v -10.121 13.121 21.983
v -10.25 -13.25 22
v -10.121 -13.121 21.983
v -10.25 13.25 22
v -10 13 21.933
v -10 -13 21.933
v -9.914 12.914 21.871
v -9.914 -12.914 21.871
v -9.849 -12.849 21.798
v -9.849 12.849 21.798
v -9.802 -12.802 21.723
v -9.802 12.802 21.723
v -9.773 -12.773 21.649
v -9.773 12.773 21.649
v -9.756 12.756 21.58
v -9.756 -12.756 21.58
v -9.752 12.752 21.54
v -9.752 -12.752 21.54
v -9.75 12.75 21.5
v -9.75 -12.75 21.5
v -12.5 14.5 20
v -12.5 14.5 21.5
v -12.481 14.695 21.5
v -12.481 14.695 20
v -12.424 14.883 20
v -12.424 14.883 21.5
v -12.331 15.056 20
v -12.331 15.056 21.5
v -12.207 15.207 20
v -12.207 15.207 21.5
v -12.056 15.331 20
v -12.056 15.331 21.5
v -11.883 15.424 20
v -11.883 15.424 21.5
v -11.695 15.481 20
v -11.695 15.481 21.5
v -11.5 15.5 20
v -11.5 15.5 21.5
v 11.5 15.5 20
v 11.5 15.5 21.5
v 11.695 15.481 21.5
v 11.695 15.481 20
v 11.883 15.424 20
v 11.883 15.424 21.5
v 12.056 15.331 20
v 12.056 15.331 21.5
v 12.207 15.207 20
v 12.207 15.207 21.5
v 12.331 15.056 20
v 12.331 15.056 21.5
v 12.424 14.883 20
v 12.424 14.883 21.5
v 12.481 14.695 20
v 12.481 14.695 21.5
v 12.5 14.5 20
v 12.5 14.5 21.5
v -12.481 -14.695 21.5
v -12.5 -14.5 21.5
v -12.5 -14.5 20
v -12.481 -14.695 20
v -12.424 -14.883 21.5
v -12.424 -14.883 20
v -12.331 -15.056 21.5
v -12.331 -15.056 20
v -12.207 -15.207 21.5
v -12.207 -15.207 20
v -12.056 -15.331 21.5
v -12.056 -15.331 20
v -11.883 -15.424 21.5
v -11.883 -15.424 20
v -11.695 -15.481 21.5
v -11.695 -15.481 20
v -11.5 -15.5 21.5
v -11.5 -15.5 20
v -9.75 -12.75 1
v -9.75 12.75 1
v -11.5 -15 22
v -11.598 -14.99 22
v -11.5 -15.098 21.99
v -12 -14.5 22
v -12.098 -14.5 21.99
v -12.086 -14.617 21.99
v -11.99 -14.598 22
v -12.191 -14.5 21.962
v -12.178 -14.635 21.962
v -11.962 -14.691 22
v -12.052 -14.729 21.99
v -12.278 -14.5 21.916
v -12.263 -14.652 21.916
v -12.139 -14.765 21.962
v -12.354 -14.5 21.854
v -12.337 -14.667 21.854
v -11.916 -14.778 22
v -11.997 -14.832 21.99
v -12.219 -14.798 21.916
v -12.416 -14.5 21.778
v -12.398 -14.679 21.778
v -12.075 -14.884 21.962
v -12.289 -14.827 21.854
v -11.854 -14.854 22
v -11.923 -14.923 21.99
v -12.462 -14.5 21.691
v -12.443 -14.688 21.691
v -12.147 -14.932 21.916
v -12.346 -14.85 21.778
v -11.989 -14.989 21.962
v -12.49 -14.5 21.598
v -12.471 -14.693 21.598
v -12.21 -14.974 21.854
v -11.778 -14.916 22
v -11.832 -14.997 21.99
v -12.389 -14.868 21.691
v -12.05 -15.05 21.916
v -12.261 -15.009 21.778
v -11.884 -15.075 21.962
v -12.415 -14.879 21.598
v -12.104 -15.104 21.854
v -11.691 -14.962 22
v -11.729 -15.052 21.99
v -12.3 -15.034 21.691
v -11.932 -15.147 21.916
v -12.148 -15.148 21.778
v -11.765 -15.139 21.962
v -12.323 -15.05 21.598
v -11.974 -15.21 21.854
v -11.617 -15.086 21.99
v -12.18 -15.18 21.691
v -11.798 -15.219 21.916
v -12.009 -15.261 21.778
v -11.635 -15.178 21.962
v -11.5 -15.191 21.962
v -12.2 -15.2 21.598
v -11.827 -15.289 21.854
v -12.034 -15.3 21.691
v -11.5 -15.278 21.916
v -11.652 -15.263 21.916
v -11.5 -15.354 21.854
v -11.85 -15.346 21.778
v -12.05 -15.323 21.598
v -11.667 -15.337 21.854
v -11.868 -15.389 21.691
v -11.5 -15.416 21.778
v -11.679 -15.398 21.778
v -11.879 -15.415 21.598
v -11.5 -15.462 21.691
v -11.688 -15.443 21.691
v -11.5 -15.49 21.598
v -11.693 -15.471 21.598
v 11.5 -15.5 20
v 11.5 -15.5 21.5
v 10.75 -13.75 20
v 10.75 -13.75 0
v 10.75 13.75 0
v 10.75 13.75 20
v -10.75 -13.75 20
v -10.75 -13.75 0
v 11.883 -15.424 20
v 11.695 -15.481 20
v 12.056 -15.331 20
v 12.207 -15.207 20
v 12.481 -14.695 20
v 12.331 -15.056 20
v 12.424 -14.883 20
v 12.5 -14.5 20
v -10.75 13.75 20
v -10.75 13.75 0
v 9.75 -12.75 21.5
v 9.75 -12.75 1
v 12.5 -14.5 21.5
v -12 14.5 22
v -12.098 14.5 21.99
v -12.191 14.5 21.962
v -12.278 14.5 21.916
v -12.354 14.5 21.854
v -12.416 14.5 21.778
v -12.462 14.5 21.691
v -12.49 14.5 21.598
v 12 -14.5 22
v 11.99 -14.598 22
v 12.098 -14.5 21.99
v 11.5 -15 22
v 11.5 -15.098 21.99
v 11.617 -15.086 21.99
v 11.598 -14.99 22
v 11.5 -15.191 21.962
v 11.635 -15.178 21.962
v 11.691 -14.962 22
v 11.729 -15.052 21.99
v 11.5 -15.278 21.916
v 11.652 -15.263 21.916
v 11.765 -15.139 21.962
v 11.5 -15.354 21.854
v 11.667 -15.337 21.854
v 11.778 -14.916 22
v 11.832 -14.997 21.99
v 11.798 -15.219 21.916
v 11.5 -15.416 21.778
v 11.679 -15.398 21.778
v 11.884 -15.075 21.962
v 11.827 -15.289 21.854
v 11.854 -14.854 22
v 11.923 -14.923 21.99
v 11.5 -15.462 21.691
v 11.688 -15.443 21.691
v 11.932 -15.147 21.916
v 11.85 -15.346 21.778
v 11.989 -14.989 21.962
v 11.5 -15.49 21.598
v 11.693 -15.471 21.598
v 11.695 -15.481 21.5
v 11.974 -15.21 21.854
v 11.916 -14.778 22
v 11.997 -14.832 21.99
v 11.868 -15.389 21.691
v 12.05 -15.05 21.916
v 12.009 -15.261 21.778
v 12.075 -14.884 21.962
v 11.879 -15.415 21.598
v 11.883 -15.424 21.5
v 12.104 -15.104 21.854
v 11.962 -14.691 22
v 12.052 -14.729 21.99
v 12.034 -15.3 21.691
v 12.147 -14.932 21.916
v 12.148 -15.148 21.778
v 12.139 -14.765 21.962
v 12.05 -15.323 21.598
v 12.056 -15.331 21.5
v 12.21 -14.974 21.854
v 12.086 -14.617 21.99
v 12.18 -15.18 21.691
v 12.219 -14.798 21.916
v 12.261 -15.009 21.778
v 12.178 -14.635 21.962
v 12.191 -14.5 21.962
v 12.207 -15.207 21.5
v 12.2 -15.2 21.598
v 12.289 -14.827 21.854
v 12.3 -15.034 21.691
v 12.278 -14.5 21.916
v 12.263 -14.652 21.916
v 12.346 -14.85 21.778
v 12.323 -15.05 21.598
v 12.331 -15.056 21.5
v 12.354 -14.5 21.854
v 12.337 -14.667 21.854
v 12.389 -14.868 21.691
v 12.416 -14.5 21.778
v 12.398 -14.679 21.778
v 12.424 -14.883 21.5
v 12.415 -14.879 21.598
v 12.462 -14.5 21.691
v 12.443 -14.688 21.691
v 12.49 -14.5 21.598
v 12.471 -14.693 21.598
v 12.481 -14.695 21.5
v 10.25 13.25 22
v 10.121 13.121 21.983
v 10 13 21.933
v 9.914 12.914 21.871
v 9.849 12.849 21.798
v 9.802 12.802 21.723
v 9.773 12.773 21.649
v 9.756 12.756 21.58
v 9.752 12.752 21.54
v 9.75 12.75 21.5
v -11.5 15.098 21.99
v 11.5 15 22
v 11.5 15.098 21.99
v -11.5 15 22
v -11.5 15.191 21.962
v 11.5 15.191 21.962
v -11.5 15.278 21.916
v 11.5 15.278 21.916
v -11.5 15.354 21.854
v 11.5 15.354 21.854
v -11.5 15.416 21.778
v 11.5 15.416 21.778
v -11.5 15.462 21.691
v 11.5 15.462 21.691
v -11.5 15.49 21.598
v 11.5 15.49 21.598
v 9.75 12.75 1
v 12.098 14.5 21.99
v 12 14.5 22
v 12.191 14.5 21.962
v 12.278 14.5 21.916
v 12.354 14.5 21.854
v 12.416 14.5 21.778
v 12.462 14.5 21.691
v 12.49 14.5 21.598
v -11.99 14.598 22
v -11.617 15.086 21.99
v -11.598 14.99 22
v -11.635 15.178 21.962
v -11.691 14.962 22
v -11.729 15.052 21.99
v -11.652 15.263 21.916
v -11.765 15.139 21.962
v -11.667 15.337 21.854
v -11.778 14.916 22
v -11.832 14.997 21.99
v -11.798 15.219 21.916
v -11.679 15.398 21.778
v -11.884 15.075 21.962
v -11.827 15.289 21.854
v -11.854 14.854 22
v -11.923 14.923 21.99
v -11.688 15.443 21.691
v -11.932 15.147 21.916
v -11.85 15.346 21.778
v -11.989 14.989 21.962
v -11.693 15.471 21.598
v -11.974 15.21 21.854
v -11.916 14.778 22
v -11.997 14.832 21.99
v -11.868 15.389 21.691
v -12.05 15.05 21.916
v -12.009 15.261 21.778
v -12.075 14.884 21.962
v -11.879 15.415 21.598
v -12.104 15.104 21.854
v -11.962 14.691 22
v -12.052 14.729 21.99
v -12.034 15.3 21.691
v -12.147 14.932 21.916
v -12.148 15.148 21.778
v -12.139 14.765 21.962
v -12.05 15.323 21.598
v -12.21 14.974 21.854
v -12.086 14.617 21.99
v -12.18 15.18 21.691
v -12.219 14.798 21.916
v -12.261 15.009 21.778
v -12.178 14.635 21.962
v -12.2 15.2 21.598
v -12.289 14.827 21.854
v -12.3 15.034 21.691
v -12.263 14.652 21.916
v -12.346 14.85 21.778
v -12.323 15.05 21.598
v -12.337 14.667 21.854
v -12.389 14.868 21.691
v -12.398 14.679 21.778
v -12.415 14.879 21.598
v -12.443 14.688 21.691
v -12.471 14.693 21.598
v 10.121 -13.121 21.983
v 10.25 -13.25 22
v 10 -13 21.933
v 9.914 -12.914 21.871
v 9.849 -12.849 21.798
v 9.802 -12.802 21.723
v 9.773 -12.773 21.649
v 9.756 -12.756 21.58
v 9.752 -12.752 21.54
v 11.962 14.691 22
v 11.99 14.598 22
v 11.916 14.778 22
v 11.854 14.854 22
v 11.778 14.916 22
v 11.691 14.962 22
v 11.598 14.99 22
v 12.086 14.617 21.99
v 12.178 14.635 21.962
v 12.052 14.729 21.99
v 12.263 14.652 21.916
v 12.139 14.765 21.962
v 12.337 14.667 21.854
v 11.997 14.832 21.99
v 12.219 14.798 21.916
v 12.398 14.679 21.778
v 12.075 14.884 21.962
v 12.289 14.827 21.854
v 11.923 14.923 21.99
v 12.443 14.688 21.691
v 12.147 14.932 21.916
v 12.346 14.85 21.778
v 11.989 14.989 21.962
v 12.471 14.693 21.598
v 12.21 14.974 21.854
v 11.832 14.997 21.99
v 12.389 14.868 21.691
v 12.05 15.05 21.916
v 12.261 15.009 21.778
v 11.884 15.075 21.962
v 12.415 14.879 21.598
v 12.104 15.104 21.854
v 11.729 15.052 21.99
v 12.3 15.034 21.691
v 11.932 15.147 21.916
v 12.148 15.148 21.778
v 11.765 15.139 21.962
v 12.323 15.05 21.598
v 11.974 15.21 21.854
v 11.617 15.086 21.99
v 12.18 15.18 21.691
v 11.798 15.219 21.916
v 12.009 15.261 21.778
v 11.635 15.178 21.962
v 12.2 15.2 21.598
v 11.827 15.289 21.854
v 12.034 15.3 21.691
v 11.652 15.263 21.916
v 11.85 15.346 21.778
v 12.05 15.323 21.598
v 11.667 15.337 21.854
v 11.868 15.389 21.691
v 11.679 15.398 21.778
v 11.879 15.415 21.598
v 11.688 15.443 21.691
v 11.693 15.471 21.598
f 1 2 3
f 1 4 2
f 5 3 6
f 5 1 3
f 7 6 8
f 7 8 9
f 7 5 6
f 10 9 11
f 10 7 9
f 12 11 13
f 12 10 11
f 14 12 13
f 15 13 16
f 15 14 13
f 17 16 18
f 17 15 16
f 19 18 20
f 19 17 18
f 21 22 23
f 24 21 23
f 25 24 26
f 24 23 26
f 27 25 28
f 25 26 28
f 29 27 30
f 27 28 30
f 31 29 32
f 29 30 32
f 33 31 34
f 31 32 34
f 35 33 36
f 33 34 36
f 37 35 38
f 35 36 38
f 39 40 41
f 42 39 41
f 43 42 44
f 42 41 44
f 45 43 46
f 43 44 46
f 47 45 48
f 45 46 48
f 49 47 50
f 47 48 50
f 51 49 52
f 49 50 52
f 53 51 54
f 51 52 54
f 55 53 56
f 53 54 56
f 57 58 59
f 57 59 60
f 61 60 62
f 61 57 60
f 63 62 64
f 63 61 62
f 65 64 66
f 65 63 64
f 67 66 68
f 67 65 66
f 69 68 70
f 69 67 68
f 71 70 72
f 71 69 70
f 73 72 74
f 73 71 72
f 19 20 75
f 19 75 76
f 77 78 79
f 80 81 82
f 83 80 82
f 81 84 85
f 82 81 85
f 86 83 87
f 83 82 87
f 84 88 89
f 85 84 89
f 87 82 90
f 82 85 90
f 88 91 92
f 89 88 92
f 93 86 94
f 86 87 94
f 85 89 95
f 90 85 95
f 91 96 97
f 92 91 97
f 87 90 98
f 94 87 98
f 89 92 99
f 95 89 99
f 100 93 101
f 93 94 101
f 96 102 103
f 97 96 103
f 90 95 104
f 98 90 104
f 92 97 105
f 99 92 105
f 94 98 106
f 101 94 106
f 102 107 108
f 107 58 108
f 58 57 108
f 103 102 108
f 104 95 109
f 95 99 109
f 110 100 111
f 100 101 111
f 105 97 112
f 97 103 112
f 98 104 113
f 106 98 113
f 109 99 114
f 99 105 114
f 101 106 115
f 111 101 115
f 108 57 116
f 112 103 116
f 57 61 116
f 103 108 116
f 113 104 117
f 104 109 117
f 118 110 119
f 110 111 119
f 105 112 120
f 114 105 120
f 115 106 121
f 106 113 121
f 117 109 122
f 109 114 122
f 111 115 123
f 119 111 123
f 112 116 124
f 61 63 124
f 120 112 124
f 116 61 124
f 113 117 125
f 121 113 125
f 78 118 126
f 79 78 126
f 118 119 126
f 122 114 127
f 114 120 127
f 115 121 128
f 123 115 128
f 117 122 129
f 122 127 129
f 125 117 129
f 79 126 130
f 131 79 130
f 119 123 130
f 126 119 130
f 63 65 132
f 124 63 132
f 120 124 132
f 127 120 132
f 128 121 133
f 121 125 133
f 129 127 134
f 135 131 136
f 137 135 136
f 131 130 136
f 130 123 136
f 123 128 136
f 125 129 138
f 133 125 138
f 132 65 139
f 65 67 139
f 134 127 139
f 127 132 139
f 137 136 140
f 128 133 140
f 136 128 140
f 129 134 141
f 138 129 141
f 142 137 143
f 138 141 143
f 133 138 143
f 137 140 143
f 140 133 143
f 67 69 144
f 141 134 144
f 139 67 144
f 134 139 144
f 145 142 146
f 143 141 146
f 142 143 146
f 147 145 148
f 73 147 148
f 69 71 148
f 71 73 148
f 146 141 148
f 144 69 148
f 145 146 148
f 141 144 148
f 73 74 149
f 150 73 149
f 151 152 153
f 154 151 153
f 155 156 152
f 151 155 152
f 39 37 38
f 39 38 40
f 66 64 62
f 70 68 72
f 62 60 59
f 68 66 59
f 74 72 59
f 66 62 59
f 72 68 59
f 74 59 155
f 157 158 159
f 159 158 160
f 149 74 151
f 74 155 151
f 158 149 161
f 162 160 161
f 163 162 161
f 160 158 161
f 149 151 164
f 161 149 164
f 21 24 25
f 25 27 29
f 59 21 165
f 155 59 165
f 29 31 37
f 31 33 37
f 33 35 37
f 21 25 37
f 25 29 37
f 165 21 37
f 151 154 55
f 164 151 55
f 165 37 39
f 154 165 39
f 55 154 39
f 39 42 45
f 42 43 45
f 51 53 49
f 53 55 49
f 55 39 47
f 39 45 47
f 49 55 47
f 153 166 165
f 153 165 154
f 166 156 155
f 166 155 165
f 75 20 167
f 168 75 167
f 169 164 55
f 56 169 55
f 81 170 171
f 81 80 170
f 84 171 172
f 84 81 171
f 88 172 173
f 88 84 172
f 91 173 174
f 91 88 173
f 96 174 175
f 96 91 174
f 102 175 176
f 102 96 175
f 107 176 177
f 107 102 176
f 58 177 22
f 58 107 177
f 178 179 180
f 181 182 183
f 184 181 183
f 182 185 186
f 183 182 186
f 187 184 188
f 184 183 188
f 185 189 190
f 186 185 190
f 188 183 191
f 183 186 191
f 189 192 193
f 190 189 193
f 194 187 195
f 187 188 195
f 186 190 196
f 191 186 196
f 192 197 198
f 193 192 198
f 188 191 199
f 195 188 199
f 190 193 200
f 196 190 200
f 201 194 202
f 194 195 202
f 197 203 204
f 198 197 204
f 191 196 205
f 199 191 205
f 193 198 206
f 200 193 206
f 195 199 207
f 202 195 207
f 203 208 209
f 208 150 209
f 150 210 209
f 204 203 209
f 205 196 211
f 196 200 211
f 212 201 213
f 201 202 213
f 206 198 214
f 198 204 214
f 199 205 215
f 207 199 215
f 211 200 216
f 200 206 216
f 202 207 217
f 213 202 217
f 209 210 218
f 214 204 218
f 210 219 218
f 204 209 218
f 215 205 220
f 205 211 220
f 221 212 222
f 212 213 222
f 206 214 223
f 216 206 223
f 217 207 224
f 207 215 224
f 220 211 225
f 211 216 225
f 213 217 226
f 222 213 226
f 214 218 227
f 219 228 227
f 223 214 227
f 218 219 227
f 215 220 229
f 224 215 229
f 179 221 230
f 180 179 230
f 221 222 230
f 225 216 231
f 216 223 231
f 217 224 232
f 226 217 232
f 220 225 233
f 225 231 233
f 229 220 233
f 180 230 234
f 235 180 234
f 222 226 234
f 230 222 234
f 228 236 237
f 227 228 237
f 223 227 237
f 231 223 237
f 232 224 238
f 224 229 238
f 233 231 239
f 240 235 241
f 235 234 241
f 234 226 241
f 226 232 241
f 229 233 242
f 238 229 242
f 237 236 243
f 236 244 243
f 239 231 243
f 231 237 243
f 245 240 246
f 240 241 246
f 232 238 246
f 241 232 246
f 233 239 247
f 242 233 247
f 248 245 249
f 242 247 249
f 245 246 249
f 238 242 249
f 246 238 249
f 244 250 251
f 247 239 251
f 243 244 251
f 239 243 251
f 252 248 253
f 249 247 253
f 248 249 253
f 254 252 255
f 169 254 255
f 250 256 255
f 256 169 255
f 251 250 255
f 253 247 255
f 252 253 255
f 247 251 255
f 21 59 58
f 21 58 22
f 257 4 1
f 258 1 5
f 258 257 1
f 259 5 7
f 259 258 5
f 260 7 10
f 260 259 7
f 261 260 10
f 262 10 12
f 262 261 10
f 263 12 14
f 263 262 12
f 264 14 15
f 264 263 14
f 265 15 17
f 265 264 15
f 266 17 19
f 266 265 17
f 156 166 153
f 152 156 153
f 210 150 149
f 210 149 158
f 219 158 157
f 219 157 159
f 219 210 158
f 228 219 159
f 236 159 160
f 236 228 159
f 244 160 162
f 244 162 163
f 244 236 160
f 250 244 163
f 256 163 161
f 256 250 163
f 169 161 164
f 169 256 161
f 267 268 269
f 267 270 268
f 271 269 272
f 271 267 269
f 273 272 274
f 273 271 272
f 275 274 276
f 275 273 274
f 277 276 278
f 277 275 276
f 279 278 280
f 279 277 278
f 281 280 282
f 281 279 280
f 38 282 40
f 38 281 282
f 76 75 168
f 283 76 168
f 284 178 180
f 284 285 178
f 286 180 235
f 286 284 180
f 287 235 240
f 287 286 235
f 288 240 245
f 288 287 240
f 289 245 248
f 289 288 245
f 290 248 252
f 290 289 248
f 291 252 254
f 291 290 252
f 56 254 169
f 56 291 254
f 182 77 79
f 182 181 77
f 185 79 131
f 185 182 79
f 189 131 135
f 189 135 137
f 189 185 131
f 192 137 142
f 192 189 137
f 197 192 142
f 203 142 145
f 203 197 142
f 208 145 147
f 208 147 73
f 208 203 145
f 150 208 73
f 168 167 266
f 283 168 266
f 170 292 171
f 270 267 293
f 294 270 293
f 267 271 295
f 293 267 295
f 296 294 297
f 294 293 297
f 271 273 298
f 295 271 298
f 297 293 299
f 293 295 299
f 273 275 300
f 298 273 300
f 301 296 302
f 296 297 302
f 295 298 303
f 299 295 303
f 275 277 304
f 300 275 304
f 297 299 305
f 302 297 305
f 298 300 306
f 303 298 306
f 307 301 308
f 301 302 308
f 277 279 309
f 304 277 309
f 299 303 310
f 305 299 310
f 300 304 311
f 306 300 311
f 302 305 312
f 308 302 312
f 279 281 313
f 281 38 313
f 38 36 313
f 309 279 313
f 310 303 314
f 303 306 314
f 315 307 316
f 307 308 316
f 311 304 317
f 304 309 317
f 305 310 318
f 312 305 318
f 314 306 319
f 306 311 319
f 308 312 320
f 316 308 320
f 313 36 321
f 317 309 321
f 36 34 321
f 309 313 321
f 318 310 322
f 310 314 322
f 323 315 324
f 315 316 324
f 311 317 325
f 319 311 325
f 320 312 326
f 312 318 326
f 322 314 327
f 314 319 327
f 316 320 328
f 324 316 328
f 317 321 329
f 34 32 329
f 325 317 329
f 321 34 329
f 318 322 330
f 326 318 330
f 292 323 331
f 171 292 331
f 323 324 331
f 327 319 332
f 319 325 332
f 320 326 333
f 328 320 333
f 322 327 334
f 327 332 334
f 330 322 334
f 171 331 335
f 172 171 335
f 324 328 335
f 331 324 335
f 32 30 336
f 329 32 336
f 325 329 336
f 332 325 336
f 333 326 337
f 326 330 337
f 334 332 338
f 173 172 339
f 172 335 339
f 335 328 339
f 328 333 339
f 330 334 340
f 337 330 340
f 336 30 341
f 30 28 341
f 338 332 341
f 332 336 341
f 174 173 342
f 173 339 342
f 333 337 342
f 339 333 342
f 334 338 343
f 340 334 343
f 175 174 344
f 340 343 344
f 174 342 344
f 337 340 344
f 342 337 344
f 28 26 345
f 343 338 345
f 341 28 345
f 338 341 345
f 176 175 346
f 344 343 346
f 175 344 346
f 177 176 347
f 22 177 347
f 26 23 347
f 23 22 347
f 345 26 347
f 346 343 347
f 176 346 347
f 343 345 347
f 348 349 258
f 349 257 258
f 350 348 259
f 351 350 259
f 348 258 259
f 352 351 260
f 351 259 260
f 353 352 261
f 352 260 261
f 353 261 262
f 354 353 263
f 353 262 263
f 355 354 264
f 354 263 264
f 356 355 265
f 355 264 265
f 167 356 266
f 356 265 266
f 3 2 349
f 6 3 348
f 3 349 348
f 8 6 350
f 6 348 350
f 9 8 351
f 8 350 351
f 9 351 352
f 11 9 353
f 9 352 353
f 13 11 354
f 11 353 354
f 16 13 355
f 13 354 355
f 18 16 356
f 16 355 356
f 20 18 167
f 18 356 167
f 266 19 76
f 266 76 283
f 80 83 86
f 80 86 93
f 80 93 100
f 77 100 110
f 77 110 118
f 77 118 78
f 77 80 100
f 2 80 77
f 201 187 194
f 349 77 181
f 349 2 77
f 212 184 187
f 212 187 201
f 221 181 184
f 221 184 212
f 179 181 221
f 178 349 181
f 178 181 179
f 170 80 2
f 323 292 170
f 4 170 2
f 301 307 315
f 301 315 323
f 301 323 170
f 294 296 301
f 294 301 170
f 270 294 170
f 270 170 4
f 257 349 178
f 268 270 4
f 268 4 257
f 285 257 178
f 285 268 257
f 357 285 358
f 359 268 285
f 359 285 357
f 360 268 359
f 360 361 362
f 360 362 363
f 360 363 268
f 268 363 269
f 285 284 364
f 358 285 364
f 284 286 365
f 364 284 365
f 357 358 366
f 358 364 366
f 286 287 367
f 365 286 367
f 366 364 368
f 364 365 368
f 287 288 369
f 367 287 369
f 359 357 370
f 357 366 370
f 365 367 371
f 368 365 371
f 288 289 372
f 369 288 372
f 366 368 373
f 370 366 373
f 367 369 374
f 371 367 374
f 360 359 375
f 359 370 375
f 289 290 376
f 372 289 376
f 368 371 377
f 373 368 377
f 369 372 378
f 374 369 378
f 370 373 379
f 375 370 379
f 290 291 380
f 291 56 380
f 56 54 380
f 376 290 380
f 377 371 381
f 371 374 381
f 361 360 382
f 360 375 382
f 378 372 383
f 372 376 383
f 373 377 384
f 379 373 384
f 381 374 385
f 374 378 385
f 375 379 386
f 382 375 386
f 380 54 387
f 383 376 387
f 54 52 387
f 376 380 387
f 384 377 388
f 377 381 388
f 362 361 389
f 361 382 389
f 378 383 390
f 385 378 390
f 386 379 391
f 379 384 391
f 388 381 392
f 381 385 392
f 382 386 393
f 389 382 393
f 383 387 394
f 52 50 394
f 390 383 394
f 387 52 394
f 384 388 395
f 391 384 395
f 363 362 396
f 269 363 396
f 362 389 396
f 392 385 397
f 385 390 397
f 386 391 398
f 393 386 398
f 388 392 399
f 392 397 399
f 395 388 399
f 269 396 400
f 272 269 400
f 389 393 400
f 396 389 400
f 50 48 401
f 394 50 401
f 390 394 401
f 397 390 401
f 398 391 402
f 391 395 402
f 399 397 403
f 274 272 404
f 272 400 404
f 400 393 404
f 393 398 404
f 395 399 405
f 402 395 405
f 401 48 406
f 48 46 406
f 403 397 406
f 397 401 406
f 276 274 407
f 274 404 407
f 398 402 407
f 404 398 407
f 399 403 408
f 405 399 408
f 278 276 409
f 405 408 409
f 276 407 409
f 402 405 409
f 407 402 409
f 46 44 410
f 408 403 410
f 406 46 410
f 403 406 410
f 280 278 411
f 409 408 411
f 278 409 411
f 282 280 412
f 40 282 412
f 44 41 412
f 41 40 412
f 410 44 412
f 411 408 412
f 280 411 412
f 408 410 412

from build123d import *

# Parameters (mm, degrees)
SKETCH1_W           = 21.5
SKETCH1_H           = 27.5
BOSS_EXTRUDE1_DEPTH = 20
SKETCH2_W           = 25
SKETCH2_H           = 31
BOSS_EXTRUDE2_DEPTH = 2
SKETCH3_W           = 19.5
SKETCH3_H           = 25.5
CUT_EXTRUDE1_DEPTH  = 21
FILLET1_R           = 1
FILLET2_R           = 0.5


with BuildPart() as part:
    # Sketch1 → Boss-Extrude1 (new body)
    with BuildSketch(Plane.XY):
        Rectangle(SKETCH1_W, SKETCH1_H)
    extrude(amount=BOSS_EXTRUDE1_DEPTH)

    # Sketch2 → Boss-Extrude2 (add)
    with BuildSketch(Plane.XY.offset(20)):
        Rectangle(SKETCH2_W, SKETCH2_H)
    extrude(amount=BOSS_EXTRUDE2_DEPTH)

    # Sketch3 → Cut-Extrude1 (cut)
    with BuildSketch(Plane.XY.offset(22)):
        Rectangle(SKETCH3_W, SKETCH3_H)
    extrude(amount=-CUT_EXTRUDE1_DEPTH, mode=Mode.SUBTRACT)

    # Fillet1
    fillet1_edges = [part.edges().sort_by_distance(p)[0] for p in [
        (12.5, -15.5, 21),
        (12.5, 15.5, 21),
        (-12.5, 15.5, 21),
        (-12.5, -15.5, 21),
    ]]
    fillet(fillet1_edges, radius=FILLET1_R)

    # Fillet2
    fillet2_edges = [part.edges().sort_by_distance(p)[0] for p in [
        (9.75, 0, 22),
        (0, 12.75, 22),
        (-9.75, 0, 22),
        (0, -12.75, 22),
        (0, -15.5, 22),
        (-12.5, 0, 22),
        (12.5, 0, 22),
        (0, 15.5, 22),
        (12.207106781, 15.207106781, 22),
        (-12.207106781, 15.207106781, 22),
        (12.207106781, -15.207106781, 22),
        (-12.207106781, -15.207106781, 22),
    ]]
    fillet(fillet2_edges, radius=FILLET2_R)


solid = part.part
